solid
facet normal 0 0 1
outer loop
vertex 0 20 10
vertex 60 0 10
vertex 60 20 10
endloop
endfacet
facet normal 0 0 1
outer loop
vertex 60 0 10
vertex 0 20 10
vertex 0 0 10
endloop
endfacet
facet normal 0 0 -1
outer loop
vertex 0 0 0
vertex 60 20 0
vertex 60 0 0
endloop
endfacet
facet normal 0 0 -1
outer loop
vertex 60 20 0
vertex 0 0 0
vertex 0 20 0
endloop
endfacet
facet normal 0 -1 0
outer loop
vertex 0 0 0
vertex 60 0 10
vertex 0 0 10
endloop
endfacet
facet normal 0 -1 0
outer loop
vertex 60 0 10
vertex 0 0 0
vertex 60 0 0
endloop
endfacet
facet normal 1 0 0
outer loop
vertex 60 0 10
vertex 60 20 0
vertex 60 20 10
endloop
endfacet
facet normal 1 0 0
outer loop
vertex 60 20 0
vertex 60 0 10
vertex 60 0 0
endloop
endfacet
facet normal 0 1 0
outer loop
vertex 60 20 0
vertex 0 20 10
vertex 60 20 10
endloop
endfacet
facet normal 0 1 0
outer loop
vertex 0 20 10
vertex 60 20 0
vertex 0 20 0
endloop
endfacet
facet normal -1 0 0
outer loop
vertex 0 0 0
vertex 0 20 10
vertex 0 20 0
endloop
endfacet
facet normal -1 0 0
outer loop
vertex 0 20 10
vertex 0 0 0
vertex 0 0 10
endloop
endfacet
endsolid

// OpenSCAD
// Sharp 90 deg corners on a 60 mm long plate face.
cube([60, 20, 10]);
